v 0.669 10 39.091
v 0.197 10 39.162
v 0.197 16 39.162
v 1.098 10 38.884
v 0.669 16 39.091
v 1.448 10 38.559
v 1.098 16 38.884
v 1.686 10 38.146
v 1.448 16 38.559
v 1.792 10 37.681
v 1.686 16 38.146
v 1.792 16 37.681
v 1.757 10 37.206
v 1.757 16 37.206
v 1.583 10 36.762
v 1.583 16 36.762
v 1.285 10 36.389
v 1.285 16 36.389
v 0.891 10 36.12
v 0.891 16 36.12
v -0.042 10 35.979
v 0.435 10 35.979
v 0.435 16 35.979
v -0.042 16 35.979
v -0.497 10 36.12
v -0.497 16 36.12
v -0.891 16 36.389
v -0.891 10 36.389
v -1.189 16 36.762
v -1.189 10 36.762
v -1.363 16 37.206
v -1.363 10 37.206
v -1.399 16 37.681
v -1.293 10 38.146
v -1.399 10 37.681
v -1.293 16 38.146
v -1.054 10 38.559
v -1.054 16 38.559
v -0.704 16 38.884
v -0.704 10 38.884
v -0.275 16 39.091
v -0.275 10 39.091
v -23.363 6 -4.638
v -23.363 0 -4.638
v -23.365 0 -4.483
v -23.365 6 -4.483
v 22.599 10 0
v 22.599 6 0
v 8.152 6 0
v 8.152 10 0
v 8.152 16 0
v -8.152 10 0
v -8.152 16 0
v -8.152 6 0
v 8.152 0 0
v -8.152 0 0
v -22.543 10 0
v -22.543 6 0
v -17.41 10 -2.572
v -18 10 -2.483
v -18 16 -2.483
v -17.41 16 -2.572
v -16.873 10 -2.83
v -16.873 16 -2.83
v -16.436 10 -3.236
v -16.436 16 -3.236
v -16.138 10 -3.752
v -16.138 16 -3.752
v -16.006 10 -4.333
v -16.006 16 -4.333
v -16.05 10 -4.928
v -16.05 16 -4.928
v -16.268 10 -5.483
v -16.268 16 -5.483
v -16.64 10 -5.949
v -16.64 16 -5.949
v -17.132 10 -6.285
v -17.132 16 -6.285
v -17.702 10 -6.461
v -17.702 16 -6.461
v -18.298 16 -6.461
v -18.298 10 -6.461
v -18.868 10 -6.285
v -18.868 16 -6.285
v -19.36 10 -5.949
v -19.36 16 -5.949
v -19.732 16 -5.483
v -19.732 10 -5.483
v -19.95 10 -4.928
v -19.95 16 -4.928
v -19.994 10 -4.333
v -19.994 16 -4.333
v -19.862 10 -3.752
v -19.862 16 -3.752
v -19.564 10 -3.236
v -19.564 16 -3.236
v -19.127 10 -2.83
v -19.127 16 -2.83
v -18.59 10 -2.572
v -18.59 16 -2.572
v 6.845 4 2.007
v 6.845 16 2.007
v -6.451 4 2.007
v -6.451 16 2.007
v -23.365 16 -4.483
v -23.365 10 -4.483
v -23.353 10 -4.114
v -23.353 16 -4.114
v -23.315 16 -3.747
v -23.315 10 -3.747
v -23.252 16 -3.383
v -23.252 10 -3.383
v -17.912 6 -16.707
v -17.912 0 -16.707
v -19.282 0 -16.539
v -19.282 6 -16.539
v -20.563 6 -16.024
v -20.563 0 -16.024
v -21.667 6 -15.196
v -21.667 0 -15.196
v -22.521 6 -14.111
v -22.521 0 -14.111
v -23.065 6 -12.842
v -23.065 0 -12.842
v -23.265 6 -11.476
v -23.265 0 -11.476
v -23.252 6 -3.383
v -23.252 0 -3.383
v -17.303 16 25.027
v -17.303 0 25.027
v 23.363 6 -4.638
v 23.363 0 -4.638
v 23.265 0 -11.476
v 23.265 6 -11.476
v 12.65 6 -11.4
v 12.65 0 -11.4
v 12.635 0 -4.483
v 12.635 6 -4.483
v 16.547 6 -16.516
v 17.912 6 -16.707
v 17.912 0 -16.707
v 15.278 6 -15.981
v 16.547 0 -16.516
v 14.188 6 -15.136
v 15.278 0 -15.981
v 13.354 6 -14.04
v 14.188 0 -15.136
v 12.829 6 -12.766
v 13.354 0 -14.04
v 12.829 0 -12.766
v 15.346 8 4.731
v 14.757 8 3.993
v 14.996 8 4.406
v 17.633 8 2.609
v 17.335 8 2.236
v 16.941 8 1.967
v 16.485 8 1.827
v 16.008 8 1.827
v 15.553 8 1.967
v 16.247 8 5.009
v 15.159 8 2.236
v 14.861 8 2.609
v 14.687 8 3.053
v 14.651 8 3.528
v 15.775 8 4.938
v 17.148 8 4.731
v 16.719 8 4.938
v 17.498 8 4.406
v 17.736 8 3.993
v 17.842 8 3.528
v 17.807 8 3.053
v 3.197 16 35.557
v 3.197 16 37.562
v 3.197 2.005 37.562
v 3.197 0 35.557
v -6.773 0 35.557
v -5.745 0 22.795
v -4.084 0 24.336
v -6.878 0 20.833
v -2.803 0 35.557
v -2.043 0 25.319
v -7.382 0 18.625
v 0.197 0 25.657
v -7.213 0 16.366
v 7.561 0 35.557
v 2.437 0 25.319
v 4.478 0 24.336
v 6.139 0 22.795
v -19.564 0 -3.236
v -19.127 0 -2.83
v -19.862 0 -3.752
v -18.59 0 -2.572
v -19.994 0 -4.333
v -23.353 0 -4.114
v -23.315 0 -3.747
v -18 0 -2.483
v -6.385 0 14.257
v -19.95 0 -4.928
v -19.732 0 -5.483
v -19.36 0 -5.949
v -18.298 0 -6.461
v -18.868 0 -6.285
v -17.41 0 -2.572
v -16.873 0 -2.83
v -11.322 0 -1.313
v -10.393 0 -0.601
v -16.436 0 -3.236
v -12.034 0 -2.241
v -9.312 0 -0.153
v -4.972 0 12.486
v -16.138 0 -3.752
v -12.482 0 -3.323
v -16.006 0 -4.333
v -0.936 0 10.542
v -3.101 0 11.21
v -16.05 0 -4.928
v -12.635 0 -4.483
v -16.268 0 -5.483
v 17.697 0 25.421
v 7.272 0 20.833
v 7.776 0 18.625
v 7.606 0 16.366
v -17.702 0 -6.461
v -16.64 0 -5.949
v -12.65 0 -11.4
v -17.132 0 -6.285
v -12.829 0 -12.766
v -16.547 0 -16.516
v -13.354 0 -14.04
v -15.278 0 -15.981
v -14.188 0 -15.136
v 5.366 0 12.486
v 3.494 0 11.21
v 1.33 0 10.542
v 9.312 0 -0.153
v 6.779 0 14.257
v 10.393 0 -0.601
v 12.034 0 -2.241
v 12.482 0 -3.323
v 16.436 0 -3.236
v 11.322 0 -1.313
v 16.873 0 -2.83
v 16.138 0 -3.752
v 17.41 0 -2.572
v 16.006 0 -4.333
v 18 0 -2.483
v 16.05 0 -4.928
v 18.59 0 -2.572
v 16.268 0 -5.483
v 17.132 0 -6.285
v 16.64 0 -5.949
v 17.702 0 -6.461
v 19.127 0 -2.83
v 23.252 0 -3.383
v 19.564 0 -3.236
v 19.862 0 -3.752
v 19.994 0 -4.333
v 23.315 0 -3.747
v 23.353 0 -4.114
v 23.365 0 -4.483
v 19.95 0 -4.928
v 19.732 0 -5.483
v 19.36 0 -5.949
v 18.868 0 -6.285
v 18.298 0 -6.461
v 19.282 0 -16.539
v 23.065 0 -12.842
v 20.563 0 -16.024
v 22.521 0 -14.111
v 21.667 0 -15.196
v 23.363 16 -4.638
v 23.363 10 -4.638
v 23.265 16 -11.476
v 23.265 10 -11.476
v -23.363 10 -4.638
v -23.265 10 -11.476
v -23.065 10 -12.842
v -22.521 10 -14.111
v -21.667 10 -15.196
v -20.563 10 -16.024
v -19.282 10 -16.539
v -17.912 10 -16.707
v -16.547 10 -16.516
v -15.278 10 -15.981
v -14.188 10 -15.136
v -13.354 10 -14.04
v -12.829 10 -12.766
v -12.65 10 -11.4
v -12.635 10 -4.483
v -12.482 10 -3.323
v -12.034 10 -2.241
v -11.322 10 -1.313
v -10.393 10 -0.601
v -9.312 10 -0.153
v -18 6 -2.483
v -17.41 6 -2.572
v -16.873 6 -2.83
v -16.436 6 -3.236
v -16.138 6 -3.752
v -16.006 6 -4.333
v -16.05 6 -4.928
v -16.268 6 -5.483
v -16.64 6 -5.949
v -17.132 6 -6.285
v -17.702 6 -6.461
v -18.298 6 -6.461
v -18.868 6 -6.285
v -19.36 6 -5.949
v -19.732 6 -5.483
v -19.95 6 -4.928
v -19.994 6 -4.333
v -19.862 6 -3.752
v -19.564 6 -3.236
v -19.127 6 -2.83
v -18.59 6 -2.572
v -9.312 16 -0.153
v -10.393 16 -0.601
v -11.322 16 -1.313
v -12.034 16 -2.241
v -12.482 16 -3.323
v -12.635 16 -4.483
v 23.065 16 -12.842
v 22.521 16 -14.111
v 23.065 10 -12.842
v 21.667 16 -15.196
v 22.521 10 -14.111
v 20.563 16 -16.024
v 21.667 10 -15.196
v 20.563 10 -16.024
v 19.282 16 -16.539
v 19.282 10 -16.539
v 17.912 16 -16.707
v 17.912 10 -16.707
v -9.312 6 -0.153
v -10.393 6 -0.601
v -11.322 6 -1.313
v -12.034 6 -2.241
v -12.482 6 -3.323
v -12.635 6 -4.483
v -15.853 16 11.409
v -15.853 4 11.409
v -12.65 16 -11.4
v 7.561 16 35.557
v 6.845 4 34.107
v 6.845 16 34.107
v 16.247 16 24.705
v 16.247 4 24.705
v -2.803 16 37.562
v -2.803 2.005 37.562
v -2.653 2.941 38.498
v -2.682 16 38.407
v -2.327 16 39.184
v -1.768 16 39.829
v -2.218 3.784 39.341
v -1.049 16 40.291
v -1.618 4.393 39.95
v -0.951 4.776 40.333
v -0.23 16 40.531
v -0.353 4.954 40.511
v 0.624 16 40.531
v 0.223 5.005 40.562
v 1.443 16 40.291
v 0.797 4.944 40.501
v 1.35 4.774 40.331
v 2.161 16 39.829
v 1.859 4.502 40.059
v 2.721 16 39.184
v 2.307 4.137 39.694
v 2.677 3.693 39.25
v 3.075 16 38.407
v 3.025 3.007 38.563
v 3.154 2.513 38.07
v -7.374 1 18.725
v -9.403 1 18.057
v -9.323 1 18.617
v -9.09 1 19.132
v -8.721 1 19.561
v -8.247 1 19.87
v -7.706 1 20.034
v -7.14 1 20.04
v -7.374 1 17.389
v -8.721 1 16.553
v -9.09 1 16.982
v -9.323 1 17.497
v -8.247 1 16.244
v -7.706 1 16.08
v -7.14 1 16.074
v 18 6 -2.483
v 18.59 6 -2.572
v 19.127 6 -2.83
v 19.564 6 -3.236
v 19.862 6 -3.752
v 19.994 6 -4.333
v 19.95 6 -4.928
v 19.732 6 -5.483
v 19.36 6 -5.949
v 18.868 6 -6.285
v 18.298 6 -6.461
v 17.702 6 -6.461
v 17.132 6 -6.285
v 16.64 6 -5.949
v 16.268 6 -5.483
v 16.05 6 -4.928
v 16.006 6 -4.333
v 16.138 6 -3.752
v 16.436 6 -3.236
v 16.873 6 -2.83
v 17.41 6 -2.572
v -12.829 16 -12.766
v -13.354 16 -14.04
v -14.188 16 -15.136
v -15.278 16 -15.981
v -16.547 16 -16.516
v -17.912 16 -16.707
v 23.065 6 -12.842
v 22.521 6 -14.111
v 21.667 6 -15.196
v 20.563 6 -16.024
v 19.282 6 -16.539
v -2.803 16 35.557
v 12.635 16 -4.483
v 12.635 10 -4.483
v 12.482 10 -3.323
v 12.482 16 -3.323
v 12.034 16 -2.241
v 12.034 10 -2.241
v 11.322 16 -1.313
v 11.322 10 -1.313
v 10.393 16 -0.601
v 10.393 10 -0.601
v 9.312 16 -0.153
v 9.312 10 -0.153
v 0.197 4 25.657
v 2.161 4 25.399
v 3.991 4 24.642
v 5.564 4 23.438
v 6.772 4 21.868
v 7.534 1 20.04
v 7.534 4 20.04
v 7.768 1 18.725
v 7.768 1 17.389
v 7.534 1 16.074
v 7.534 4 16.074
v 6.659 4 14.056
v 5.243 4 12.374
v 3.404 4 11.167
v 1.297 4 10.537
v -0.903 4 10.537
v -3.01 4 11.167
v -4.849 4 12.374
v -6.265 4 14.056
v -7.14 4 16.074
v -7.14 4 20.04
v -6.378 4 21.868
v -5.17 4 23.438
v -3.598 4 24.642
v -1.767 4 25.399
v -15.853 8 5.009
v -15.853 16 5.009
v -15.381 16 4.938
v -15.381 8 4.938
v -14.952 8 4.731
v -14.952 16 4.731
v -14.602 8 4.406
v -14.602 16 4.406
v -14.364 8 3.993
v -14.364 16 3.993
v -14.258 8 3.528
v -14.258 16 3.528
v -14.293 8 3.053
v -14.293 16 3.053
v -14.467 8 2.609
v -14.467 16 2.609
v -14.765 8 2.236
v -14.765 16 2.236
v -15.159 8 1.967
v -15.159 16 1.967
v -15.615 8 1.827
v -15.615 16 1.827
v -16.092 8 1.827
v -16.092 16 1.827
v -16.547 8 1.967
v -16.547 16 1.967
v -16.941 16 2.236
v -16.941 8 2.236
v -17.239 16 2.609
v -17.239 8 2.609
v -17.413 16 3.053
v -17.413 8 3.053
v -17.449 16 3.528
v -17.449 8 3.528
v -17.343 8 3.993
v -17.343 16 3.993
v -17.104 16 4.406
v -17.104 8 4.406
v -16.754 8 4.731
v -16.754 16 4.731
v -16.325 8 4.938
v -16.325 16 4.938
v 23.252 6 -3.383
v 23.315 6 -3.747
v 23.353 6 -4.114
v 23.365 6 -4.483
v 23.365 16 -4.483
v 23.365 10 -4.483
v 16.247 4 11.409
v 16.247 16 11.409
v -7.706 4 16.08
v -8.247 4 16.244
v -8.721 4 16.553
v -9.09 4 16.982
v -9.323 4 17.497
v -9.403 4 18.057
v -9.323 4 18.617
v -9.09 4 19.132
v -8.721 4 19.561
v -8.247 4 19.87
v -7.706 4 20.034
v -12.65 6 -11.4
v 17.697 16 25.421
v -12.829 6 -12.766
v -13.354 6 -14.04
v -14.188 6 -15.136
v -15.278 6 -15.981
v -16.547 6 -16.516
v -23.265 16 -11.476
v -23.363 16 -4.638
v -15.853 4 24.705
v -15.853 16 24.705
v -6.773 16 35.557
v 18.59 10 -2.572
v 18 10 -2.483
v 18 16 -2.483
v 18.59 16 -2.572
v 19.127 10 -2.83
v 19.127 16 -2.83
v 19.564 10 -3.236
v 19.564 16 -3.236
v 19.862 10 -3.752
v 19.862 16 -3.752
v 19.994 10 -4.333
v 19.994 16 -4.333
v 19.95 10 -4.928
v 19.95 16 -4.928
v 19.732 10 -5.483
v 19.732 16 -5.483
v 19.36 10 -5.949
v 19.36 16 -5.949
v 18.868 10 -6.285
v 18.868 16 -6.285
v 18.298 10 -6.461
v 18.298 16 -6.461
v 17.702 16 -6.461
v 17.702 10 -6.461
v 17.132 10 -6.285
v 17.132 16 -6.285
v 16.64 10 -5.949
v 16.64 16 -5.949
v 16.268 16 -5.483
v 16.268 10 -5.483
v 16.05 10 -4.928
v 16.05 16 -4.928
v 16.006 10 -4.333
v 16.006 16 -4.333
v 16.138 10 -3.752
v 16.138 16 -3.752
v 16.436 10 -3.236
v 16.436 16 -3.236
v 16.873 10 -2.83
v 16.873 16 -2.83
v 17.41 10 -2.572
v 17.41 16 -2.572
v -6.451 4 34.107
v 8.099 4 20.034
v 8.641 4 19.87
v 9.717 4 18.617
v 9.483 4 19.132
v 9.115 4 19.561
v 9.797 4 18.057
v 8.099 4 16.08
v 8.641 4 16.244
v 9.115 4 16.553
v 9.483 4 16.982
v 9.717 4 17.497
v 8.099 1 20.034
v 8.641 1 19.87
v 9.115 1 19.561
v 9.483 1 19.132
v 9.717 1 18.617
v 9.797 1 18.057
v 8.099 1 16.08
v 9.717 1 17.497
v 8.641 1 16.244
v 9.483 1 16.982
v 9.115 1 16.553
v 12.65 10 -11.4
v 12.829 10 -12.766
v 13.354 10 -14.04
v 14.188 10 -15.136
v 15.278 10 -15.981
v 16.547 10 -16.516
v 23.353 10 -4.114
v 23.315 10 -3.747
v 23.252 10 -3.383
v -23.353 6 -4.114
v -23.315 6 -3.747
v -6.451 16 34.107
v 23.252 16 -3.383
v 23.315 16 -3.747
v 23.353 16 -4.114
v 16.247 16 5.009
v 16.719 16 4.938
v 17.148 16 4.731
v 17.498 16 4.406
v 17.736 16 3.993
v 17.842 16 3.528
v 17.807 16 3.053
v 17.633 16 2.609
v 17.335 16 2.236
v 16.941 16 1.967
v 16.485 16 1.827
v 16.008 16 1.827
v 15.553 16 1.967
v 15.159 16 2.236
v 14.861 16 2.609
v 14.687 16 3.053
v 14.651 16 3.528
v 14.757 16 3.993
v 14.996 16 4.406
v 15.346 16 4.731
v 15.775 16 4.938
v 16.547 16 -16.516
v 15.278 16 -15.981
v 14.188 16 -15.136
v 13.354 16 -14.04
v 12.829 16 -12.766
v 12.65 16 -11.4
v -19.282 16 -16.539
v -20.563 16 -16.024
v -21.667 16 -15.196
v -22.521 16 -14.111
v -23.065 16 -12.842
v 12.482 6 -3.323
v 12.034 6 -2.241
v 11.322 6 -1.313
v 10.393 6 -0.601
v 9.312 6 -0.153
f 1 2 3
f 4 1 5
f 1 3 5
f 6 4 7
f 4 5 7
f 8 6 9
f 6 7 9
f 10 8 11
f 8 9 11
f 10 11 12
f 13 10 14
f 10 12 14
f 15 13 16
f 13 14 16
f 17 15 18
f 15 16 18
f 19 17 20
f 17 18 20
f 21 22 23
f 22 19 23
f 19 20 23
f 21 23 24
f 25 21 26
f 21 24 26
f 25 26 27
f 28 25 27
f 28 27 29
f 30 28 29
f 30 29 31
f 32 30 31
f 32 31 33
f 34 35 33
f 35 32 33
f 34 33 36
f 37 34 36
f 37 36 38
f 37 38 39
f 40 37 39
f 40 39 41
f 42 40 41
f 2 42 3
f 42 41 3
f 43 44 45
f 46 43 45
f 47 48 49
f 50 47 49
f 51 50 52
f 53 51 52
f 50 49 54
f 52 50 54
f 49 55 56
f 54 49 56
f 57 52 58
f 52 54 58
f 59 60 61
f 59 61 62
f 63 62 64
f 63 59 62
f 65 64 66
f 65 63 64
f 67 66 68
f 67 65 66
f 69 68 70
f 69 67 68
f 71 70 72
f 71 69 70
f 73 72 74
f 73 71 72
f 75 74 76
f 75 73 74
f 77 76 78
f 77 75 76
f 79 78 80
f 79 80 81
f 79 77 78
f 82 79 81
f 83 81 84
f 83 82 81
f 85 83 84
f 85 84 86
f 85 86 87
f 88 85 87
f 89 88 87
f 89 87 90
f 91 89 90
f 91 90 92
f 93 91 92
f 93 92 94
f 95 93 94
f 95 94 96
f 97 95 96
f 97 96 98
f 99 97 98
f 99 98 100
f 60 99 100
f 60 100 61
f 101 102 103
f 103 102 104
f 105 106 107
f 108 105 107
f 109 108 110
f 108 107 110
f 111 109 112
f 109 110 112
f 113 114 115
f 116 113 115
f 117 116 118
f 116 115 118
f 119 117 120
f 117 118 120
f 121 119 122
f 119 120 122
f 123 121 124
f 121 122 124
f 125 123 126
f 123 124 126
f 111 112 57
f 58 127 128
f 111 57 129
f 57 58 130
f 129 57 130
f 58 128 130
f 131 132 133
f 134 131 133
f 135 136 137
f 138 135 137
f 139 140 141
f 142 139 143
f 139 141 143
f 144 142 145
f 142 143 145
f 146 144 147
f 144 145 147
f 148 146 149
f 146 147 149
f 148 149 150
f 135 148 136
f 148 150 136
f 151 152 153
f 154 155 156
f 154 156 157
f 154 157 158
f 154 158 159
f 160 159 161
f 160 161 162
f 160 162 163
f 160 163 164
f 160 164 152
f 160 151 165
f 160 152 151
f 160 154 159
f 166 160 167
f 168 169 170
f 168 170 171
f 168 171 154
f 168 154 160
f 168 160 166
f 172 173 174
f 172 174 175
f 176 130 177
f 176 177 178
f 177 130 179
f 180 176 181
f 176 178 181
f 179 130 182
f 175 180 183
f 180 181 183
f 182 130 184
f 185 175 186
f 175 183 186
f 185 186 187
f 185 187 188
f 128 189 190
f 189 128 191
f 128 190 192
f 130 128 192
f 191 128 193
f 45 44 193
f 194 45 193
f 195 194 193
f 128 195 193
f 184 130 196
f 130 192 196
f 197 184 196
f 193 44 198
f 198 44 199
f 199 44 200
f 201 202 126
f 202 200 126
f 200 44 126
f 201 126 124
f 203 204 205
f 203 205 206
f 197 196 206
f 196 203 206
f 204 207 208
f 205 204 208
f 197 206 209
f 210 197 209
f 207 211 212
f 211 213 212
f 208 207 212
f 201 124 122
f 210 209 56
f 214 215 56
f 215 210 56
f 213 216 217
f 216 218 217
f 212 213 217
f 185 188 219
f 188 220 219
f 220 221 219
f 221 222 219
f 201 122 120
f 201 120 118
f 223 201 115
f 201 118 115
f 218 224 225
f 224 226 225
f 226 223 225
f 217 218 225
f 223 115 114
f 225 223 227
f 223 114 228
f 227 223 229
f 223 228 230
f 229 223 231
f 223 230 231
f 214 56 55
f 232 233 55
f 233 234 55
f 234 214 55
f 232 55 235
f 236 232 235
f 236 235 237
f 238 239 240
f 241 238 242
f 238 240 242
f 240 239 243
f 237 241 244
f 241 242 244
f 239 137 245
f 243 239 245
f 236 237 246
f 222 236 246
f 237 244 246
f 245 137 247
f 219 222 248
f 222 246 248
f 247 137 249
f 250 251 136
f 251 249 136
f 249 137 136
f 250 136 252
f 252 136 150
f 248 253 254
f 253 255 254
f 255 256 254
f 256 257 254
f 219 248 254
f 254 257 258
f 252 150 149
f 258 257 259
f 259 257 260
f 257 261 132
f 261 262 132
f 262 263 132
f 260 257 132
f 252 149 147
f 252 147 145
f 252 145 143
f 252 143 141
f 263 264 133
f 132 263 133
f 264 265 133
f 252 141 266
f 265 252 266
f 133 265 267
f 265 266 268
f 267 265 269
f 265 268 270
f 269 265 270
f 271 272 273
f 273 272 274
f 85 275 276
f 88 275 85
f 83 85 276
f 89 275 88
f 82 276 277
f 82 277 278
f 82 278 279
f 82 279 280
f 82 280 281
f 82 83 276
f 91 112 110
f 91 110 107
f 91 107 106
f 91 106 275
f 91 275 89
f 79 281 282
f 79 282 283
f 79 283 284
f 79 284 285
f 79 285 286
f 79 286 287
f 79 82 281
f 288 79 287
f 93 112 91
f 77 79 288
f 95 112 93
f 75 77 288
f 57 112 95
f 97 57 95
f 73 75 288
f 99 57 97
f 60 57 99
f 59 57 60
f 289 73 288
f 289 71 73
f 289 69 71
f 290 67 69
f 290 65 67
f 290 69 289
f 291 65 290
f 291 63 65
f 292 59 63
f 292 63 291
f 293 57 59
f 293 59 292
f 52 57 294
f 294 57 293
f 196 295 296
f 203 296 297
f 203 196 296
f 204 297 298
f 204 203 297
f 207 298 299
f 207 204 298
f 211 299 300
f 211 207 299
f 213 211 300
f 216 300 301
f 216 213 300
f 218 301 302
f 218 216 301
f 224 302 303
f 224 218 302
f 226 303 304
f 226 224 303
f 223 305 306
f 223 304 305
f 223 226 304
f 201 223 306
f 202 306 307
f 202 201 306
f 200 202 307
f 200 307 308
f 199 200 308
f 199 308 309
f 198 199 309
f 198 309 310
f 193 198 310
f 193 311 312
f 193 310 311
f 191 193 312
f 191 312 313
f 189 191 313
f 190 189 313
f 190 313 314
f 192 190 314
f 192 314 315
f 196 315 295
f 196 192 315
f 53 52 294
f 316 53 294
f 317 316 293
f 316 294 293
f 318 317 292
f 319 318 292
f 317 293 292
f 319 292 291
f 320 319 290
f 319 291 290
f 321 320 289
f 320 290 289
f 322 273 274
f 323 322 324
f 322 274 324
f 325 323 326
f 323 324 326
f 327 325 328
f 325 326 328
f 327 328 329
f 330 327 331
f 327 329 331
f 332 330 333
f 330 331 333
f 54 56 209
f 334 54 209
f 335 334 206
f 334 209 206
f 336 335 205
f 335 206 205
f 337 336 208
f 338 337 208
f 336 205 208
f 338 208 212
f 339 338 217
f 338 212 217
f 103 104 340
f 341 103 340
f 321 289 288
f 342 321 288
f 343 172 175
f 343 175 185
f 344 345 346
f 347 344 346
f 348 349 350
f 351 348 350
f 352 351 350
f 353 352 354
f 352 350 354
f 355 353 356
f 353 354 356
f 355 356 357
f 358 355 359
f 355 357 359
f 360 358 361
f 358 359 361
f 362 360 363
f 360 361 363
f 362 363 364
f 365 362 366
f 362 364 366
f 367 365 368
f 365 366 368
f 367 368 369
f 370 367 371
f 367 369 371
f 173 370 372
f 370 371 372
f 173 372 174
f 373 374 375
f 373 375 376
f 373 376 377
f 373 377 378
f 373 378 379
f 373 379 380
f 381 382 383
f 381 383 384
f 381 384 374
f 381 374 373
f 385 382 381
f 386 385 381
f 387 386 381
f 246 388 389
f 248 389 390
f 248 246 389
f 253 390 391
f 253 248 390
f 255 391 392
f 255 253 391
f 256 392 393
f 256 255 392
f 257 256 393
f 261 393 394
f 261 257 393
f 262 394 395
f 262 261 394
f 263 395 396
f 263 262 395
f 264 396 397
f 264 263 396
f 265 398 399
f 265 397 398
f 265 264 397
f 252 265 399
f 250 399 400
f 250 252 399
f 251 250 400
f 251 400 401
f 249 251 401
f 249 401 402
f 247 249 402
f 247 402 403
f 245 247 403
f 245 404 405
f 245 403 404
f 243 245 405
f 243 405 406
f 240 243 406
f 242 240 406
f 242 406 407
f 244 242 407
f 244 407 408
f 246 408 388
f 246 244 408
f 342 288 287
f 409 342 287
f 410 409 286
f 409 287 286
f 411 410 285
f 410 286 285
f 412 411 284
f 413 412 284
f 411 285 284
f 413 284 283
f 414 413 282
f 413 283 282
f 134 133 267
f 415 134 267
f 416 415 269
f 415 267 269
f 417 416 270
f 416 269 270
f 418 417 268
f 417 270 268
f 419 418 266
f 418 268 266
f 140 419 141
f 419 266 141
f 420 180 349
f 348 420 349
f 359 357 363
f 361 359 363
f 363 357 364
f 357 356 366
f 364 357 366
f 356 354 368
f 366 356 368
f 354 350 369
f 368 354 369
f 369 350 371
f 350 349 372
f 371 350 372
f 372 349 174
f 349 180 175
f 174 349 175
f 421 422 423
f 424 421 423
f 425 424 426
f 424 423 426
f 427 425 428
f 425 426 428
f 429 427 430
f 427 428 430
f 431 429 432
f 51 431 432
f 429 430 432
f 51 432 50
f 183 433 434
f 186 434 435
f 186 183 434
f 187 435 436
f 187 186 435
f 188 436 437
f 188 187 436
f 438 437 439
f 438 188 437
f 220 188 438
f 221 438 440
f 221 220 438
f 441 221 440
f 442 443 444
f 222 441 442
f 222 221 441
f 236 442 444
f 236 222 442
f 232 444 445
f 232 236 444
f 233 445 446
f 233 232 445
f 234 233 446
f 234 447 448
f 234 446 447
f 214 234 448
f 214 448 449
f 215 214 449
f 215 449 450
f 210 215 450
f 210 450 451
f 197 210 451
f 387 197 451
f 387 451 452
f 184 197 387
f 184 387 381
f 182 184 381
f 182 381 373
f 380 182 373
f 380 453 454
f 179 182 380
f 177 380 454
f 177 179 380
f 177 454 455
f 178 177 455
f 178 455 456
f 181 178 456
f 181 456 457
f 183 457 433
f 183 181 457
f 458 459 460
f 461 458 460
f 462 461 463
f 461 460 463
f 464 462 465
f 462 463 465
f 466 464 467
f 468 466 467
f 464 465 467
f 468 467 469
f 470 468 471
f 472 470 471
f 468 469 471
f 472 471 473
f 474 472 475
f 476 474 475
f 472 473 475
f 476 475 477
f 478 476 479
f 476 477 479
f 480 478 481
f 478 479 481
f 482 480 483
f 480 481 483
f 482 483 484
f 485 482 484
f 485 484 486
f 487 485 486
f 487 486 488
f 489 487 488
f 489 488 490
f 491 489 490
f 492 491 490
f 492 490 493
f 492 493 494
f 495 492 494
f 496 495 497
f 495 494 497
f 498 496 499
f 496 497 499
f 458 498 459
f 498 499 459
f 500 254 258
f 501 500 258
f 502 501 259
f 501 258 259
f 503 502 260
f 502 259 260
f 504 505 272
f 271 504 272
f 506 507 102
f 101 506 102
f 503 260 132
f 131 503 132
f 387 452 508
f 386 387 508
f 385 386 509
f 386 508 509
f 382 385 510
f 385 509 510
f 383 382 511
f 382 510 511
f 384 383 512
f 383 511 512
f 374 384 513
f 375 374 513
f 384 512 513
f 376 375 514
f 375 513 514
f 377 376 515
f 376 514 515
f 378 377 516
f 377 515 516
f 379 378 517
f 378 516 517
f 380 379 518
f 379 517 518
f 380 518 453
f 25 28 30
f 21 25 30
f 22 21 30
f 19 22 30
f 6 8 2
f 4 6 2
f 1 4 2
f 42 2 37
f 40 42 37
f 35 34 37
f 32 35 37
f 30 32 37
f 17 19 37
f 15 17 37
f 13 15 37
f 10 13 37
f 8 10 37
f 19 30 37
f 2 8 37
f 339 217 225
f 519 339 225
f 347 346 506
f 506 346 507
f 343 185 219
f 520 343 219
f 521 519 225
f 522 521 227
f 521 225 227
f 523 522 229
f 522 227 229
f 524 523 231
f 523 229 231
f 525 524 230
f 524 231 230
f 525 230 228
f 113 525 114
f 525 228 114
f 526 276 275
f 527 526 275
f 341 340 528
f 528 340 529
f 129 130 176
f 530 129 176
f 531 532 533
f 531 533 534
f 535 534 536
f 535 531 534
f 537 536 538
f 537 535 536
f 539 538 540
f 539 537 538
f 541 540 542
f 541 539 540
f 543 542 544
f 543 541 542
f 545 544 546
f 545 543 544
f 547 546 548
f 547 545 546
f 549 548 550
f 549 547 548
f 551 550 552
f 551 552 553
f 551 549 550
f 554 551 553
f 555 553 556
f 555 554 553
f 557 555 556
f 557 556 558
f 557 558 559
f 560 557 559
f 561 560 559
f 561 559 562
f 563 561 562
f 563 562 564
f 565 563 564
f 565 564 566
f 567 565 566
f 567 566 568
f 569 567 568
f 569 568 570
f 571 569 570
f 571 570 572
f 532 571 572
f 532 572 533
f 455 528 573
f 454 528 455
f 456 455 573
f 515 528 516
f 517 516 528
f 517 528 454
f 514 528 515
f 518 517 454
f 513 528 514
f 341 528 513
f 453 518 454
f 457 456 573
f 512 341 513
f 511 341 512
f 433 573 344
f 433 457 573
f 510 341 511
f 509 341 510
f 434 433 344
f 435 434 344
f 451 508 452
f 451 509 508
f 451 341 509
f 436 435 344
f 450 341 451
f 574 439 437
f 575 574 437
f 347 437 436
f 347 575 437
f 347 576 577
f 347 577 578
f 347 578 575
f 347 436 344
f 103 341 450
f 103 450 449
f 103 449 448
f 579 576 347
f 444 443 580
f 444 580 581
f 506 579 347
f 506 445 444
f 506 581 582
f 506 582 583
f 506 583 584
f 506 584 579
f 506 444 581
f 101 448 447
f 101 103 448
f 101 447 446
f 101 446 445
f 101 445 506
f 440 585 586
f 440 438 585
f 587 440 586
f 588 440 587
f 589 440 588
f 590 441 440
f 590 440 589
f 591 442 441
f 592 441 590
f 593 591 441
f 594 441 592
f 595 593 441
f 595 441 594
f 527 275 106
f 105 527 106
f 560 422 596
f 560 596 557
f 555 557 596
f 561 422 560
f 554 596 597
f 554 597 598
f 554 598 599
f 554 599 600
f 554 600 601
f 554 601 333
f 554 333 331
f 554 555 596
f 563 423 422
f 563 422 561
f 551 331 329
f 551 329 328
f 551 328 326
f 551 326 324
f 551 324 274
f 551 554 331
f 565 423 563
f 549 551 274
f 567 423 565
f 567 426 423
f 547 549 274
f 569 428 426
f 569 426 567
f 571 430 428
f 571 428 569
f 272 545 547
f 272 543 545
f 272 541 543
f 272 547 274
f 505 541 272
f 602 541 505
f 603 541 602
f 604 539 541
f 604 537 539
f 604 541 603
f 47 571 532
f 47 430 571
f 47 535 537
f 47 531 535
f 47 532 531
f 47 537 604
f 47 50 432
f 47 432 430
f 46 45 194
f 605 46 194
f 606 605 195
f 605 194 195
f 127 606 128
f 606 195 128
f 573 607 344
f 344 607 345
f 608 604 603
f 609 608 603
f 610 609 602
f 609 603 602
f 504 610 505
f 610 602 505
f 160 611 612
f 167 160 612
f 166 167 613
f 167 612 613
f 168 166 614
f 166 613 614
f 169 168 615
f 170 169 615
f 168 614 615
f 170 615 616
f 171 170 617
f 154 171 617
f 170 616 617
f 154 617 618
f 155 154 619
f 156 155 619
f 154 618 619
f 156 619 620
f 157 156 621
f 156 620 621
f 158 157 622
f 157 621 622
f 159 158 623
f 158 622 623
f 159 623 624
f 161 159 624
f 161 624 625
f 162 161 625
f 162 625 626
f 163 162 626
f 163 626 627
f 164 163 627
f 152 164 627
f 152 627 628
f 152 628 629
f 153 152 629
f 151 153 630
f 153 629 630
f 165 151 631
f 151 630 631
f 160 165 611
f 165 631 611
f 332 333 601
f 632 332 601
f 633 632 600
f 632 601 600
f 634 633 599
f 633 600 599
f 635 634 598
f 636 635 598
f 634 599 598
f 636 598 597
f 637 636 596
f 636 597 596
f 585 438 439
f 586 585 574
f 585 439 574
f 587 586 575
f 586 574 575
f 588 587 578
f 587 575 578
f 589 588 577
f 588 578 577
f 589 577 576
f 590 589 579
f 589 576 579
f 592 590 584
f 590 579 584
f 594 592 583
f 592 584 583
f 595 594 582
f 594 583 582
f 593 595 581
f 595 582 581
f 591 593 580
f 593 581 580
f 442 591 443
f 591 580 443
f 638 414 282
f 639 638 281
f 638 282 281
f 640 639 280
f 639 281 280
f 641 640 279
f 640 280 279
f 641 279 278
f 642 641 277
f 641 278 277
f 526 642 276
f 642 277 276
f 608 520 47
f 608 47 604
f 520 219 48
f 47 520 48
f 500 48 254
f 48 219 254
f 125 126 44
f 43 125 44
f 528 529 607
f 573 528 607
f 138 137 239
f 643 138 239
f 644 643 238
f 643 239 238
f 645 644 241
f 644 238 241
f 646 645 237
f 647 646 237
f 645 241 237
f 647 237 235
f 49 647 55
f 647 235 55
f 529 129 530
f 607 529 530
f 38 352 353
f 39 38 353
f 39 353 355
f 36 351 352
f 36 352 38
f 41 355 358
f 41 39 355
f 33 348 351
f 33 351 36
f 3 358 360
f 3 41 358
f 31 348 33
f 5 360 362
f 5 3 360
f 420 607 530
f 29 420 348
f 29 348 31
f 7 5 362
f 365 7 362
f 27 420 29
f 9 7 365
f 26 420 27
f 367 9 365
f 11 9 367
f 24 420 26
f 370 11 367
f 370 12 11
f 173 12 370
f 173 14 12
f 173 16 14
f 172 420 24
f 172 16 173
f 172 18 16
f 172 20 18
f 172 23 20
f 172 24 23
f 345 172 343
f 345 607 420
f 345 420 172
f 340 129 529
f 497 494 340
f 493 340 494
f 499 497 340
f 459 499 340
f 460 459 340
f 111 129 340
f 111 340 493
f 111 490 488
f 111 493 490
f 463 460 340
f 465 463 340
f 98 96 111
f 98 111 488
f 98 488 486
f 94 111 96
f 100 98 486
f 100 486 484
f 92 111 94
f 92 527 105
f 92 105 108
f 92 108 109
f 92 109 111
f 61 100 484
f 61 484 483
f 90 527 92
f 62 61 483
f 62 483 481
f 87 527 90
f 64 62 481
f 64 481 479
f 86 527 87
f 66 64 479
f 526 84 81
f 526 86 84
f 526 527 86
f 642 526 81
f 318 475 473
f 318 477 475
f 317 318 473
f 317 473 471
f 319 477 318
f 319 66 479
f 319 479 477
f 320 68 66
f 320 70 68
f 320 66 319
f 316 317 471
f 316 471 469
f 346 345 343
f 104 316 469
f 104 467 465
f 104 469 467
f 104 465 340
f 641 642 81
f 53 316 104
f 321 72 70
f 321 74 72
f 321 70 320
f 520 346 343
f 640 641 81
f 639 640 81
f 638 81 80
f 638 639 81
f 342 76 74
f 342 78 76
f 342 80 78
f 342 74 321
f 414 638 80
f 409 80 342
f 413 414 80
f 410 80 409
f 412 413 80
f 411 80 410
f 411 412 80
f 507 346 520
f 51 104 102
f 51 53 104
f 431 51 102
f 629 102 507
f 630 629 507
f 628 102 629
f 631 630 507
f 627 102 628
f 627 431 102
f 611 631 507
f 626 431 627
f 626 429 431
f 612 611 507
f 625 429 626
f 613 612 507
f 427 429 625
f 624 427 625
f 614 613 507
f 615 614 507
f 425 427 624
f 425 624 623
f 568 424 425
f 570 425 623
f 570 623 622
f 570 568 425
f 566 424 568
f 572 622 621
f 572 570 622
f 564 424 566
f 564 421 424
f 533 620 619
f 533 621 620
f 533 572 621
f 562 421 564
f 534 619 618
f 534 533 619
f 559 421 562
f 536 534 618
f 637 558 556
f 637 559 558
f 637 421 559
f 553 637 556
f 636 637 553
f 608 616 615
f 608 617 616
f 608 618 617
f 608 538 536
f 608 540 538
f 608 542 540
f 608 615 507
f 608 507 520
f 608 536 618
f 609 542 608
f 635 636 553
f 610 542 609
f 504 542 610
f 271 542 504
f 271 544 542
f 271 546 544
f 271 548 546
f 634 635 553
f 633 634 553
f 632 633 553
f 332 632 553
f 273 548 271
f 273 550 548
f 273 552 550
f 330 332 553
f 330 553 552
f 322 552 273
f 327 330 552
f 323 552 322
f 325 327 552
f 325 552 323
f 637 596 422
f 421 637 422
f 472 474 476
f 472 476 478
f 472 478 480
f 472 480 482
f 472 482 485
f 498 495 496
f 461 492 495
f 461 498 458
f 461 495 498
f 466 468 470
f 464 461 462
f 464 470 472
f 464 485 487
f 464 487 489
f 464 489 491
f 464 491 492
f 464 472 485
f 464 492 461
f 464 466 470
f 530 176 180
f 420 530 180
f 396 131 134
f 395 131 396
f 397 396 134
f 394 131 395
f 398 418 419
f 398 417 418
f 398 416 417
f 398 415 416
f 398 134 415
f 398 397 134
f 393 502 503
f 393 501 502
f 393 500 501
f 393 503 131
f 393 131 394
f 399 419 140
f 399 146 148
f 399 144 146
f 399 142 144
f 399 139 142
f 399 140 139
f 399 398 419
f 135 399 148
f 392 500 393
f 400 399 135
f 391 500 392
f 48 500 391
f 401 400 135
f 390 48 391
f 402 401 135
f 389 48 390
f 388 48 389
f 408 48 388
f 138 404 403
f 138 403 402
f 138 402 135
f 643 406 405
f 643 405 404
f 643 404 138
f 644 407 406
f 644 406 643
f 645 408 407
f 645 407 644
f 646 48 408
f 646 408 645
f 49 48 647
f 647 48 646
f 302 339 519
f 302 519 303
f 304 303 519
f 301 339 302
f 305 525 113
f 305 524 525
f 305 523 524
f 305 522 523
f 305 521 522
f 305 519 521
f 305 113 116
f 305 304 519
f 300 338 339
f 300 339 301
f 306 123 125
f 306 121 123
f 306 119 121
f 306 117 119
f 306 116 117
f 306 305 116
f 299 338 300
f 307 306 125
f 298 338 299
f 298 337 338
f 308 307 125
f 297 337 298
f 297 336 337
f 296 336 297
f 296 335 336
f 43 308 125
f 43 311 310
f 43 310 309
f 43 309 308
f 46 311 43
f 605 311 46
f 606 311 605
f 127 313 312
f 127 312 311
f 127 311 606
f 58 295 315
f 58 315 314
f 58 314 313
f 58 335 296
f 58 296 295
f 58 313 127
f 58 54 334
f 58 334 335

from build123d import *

# Parameters (mm, degrees)
SKETCH1_R            = 7.6
SKETCH1_R_2          = 2
BOSS_EXTRUDE2_DEPTH  = 16
CUT_EXTRUDE1_DEPTH   = 12
SKETCH3_R            = 2
CUT_EXTRUDE2_DEPTH   = 3
SKETCH4_W            = 19.148912363
SKETCH4_H            = 4
SKETCH4_W_2          = 1.506114963
SKETCH4_H_2          = 2
SKETCH4_W_3          = 17.088400717
CUT_EXTRUDE3_DEPTH   = 34
SKETCH5_R            = 1.6
CUT_EXTRUDE4_DEPTH   = 8
SKETCH6_R            = 1.6
BOSS_EXTRUDE4_DEPTH  = 7
BOSS_EXTRUDE7_START  = -1
SKETCH9_R            = 1.6
BOSS_EXTRUDE7_DEPTH  = 1
CHAMFER2_START       = 5.004712753
CHAMFER2_DEPTH       = 3.995287247
CHAMFER2_2_DEPTH     = 5.004712753
CHAMFER2_START_2     = -28.681393589
CHAMFER2_3_OUTLINE_W = 6
CHAMFER2_3_OUTLINE_H = 10
CHAMFER2_3_DEPTH     = 3.538866325


with BuildPart() as part:
    # Sketch1 → Boss-Extrude2 (new body)
    with BuildSketch(Plane(origin=(0, 0, 0), x_dir=(1, 0, 0), z_dir=(0, 1, 0))):
        with BuildLine():
            Line((-6.773390856, -35.556903049), (7.560970701, -35.556903049))
            Line((7.560970701, -35.556903049), (17.696894961, -25.420978788))
            Line((17.696894961, -25.420978788), (23.251588719, 3.383405224))
            ThreePointArc((23.251588719, 3.383405224), (23.336919229, 3.930241848), (23.365463973, 4.482959485))
            Line((23.365463973, 4.482959485), (23.363235853, 4.637571356))
            Line((23.363235853, 4.637571356), (23.264685107, 11.476123671))
            ThreePointArc((23.264685107, 11.476123671), (21.66723092, 15.195624527), (17.911941271, 16.707029882))
            ThreePointArc((17.911941271, 16.707029882), (14.188498301, 15.136475123), (12.650070184, 11.399643748))
            Line((12.650070184, 11.399643748), (12.634536027, 4.482959485))
            ThreePointArc((12.634536027, 4.482959485), (11.321507594, 1.313028433), (8.151576542, 0))
            Line((8.151576542, 0), (7.167180778, 0))
            Line((7.167180778, 0), (0, 0))
            Line((0, 0), (-7.167180778, 0))
            Line((-7.167180778, 0), (-8.151576542, 0))
            ThreePointArc((-8.151576542, 0), (-11.321507594, 1.313028433), (-12.634536027, 4.482959485))
            Line((-12.634536027, 4.482959485), (-12.650070184, 11.399643748))
            ThreePointArc((-12.650070184, 11.399643748), (-14.188498301, 15.136475123), (-17.911941271, 16.707029882))
            ThreePointArc((-17.911941271, 16.707029882), (-21.66723092, 15.195624527), (-23.264685107, 11.476123671))
            Line((-23.264685107, 11.476123671), (-23.363235853, 4.637571356))
            Line((-23.363235853, 4.637571356), (-23.365463973, 4.482959485))
            ThreePointArc((-23.365463973, 4.482959485), (-23.336919229, 3.930241848), (-23.251588719, 3.383405224))
            Line((-23.251588719, 3.383405224), (-17.303105039, -25.027188866))
            Line((-17.303105039, -25.027188866), (-6.773390856, -35.556903049))
        make_face()
        with Locations(Location((0.196894961, -18.056903049, 0), (0, 0, 270))):
            Circle(SKETCH1_R, mode=Mode.SUBTRACT)
        with Locations(Location((-18, 4.482959485, 0), (0, 0, 270))):
            Circle(SKETCH1_R_2, mode=Mode.SUBTRACT)
        with Locations(Location((18, 4.482959485, 0), (0, 0, 270))):
            Circle(SKETCH1_R_2, mode=Mode.SUBTRACT)
    extrude(amount=BOSS_EXTRUDE2_DEPTH)

    # Sketch2 → Cut-Extrude1 (cut)
    with BuildSketch(Plane(origin=(0, 16, 0), x_dir=(1, 0, 0), z_dir=(0, 1, 0))):
        Polygon((-6.451232715, -34.106903049), (6.845022637, -34.106903049), (16.246894961, -24.705030725), (16.246894961, -11.408775373), (6.845022637, -2.006903049), (-6.451232715, -2.006903049), (-15.853105039, -11.408775373), (-15.853105039, -24.705030725), align=None)
    extrude(amount=-CUT_EXTRUDE1_DEPTH, mode=Mode.SUBTRACT)

    # Sketch3 → Cut-Extrude2 (cut)
    with BuildSketch(Plane(origin=(0, 4, 0), x_dir=(1, 0, 0), z_dir=(0, 1, 0))):
        with Locations((7.796894961, -18.056903049)):
            Circle(SKETCH3_R)
        with Locations((-7.403105039, -18.056903049)):
            Circle(SKETCH3_R)
    extrude(amount=-CUT_EXTRUDE2_DEPTH, mode=Mode.SUBTRACT)

    # Sketch4 → Cut-Extrude3 (cut)
    with BuildSketch(Plane(origin=(0, 0, 0), x_dir=(-1, 0, 0), z_dir=(0, 0, -1))):
        with Locations((17.726032724, 8)):
            Rectangle(SKETCH4_W, SKETCH4_H)
        Polygon((8.151576542, 10), (1.506114963, 10), (1.506114963, 8), (1.506114963, 6), (8.151576542, 6), align=None)
        Polygon((0, 8), (0, 10), (-8.151576542, 10), (-8.151576542, 6), (0, 6), align=None)
        with Locations((0.753057482, 9)):
            Rectangle(SKETCH4_W_2, SKETCH4_H_2)
        with Locations((0.753057482, 7)):
            Rectangle(SKETCH4_W_2, SKETCH4_H_2)
        with Locations((-16.695776901, 8)):
            Rectangle(SKETCH4_W_3, SKETCH4_H)
    extrude(amount=CUT_EXTRUDE3_DEPTH, mode=Mode.SUBTRACT)

    # Sketch5 → Cut-Extrude4 (cut)
    with BuildSketch(Plane(origin=(0, 16, 0), x_dir=(1, 0, 0), z_dir=(0, 1, 0))):
        with Locations(Location((16.246894961, -3.408775373, 0), (0, 0, 270))):
            Circle(SKETCH5_R)
        with Locations(Location((-15.853105039, -3.408775373, 0), (0, 0, 270))):
            Circle(SKETCH5_R)
    extrude(amount=-CUT_EXTRUDE4_DEPTH, mode=Mode.SUBTRACT)

    # Sketch6 → Boss-Extrude4 (add)
    with BuildSketch(Plane(origin=(0, 16, 0), x_dir=(1, 0, 0), z_dir=(0, 1, 0))):
        with BuildLine():
            Line((3.196894961, -35.556903049), (-2.803105039, -35.556903049))
            Line((-2.803105039, -35.556903049), (-2.803105039, -37.561615802))
            ThreePointArc((-2.803105039, -37.561615802), (0.196894961, -40.561615802), (3.196894961, -37.561615802))
            Line((3.196894961, -37.561615802), (3.196894961, -35.556903049))
        make_face()
        with Locations(Location((0.196894961, -37.561615802, 0), (0, 0, 270))):
            Circle(SKETCH6_R, mode=Mode.SUBTRACT)
    extrude(amount=-BOSS_EXTRUDE4_DEPTH)

    # Sketch9 → Boss-Extrude7 (add)
    with BuildSketch(Plane.XZ.offset(-9).offset(BOSS_EXTRUDE7_START)):
        with Locations(Location((0.196894961, 37.561615802, 0), (0, 0, 90))):
            Circle(SKETCH9_R)
    extrude(amount=BOSS_EXTRUDE7_DEPTH)

    # Chamfer2: read off the stored shape, not the designer's step
    # Chamfer2 outline → Chamfer2 (add)
    with BuildSketch(Plane(origin=(0, 0, 0), x_dir=(1, 0, 0), z_dir=(0, 1, 0)).offset(CHAMFER2_START)):
        with BuildLine():
            ThreePointArc((-2.803105039, -37.561615802), (0.196894961, -40.561615802), (3.196894961, -37.561615802))
            Line((3.196894961, -37.561615802), (3.196894961, -35.556903049))
            Line((3.196894961, -35.556903049), (-2.803105039, -35.556903049))
            Line((-2.803105039, -35.556903049), (-2.803105039, -37.561615802))
        make_face()
    extrude(amount=CHAMFER2_DEPTH)

    # Chamfer2 2 outline → Chamfer2 2 (add)
    with BuildSketch(Plane(origin=(0, 0, 0), x_dir=(1, 0, 0), z_dir=(0, 1, 0))):
        with BuildLine():
            ThreePointArc((-2.803105039, -37.561615802), (0.196894961, -40.561615802), (3.196894961, -37.561615802))
            Line((3.196894961, -37.561615802), (3.196894961, -35.556903049))
            Line((3.196894961, -35.556903049), (-2.803105039, -35.556903049))
            Line((-2.803105039, -35.556903049), (-2.803105039, -37.561615802))
        make_face()
    extrude(amount=CHAMFER2_2_DEPTH)

    # Chamfer2 3 outline → Chamfer2 3 (cut)
    with BuildSketch(Plane(origin=(0, 0, 0), x_dir=(1, 0, 0), z_dir=(0, 0.7071067811865511, -0.7071067811865441)).offset(CHAMFER2_START_2)):
        with Locations((0.196894961, -29)):
            Rectangle(CHAMFER2_3_OUTLINE_W, CHAMFER2_3_OUTLINE_H)
    extrude(amount=CHAMFER2_3_DEPTH, mode=Mode.SUBTRACT)


solid = part.part
